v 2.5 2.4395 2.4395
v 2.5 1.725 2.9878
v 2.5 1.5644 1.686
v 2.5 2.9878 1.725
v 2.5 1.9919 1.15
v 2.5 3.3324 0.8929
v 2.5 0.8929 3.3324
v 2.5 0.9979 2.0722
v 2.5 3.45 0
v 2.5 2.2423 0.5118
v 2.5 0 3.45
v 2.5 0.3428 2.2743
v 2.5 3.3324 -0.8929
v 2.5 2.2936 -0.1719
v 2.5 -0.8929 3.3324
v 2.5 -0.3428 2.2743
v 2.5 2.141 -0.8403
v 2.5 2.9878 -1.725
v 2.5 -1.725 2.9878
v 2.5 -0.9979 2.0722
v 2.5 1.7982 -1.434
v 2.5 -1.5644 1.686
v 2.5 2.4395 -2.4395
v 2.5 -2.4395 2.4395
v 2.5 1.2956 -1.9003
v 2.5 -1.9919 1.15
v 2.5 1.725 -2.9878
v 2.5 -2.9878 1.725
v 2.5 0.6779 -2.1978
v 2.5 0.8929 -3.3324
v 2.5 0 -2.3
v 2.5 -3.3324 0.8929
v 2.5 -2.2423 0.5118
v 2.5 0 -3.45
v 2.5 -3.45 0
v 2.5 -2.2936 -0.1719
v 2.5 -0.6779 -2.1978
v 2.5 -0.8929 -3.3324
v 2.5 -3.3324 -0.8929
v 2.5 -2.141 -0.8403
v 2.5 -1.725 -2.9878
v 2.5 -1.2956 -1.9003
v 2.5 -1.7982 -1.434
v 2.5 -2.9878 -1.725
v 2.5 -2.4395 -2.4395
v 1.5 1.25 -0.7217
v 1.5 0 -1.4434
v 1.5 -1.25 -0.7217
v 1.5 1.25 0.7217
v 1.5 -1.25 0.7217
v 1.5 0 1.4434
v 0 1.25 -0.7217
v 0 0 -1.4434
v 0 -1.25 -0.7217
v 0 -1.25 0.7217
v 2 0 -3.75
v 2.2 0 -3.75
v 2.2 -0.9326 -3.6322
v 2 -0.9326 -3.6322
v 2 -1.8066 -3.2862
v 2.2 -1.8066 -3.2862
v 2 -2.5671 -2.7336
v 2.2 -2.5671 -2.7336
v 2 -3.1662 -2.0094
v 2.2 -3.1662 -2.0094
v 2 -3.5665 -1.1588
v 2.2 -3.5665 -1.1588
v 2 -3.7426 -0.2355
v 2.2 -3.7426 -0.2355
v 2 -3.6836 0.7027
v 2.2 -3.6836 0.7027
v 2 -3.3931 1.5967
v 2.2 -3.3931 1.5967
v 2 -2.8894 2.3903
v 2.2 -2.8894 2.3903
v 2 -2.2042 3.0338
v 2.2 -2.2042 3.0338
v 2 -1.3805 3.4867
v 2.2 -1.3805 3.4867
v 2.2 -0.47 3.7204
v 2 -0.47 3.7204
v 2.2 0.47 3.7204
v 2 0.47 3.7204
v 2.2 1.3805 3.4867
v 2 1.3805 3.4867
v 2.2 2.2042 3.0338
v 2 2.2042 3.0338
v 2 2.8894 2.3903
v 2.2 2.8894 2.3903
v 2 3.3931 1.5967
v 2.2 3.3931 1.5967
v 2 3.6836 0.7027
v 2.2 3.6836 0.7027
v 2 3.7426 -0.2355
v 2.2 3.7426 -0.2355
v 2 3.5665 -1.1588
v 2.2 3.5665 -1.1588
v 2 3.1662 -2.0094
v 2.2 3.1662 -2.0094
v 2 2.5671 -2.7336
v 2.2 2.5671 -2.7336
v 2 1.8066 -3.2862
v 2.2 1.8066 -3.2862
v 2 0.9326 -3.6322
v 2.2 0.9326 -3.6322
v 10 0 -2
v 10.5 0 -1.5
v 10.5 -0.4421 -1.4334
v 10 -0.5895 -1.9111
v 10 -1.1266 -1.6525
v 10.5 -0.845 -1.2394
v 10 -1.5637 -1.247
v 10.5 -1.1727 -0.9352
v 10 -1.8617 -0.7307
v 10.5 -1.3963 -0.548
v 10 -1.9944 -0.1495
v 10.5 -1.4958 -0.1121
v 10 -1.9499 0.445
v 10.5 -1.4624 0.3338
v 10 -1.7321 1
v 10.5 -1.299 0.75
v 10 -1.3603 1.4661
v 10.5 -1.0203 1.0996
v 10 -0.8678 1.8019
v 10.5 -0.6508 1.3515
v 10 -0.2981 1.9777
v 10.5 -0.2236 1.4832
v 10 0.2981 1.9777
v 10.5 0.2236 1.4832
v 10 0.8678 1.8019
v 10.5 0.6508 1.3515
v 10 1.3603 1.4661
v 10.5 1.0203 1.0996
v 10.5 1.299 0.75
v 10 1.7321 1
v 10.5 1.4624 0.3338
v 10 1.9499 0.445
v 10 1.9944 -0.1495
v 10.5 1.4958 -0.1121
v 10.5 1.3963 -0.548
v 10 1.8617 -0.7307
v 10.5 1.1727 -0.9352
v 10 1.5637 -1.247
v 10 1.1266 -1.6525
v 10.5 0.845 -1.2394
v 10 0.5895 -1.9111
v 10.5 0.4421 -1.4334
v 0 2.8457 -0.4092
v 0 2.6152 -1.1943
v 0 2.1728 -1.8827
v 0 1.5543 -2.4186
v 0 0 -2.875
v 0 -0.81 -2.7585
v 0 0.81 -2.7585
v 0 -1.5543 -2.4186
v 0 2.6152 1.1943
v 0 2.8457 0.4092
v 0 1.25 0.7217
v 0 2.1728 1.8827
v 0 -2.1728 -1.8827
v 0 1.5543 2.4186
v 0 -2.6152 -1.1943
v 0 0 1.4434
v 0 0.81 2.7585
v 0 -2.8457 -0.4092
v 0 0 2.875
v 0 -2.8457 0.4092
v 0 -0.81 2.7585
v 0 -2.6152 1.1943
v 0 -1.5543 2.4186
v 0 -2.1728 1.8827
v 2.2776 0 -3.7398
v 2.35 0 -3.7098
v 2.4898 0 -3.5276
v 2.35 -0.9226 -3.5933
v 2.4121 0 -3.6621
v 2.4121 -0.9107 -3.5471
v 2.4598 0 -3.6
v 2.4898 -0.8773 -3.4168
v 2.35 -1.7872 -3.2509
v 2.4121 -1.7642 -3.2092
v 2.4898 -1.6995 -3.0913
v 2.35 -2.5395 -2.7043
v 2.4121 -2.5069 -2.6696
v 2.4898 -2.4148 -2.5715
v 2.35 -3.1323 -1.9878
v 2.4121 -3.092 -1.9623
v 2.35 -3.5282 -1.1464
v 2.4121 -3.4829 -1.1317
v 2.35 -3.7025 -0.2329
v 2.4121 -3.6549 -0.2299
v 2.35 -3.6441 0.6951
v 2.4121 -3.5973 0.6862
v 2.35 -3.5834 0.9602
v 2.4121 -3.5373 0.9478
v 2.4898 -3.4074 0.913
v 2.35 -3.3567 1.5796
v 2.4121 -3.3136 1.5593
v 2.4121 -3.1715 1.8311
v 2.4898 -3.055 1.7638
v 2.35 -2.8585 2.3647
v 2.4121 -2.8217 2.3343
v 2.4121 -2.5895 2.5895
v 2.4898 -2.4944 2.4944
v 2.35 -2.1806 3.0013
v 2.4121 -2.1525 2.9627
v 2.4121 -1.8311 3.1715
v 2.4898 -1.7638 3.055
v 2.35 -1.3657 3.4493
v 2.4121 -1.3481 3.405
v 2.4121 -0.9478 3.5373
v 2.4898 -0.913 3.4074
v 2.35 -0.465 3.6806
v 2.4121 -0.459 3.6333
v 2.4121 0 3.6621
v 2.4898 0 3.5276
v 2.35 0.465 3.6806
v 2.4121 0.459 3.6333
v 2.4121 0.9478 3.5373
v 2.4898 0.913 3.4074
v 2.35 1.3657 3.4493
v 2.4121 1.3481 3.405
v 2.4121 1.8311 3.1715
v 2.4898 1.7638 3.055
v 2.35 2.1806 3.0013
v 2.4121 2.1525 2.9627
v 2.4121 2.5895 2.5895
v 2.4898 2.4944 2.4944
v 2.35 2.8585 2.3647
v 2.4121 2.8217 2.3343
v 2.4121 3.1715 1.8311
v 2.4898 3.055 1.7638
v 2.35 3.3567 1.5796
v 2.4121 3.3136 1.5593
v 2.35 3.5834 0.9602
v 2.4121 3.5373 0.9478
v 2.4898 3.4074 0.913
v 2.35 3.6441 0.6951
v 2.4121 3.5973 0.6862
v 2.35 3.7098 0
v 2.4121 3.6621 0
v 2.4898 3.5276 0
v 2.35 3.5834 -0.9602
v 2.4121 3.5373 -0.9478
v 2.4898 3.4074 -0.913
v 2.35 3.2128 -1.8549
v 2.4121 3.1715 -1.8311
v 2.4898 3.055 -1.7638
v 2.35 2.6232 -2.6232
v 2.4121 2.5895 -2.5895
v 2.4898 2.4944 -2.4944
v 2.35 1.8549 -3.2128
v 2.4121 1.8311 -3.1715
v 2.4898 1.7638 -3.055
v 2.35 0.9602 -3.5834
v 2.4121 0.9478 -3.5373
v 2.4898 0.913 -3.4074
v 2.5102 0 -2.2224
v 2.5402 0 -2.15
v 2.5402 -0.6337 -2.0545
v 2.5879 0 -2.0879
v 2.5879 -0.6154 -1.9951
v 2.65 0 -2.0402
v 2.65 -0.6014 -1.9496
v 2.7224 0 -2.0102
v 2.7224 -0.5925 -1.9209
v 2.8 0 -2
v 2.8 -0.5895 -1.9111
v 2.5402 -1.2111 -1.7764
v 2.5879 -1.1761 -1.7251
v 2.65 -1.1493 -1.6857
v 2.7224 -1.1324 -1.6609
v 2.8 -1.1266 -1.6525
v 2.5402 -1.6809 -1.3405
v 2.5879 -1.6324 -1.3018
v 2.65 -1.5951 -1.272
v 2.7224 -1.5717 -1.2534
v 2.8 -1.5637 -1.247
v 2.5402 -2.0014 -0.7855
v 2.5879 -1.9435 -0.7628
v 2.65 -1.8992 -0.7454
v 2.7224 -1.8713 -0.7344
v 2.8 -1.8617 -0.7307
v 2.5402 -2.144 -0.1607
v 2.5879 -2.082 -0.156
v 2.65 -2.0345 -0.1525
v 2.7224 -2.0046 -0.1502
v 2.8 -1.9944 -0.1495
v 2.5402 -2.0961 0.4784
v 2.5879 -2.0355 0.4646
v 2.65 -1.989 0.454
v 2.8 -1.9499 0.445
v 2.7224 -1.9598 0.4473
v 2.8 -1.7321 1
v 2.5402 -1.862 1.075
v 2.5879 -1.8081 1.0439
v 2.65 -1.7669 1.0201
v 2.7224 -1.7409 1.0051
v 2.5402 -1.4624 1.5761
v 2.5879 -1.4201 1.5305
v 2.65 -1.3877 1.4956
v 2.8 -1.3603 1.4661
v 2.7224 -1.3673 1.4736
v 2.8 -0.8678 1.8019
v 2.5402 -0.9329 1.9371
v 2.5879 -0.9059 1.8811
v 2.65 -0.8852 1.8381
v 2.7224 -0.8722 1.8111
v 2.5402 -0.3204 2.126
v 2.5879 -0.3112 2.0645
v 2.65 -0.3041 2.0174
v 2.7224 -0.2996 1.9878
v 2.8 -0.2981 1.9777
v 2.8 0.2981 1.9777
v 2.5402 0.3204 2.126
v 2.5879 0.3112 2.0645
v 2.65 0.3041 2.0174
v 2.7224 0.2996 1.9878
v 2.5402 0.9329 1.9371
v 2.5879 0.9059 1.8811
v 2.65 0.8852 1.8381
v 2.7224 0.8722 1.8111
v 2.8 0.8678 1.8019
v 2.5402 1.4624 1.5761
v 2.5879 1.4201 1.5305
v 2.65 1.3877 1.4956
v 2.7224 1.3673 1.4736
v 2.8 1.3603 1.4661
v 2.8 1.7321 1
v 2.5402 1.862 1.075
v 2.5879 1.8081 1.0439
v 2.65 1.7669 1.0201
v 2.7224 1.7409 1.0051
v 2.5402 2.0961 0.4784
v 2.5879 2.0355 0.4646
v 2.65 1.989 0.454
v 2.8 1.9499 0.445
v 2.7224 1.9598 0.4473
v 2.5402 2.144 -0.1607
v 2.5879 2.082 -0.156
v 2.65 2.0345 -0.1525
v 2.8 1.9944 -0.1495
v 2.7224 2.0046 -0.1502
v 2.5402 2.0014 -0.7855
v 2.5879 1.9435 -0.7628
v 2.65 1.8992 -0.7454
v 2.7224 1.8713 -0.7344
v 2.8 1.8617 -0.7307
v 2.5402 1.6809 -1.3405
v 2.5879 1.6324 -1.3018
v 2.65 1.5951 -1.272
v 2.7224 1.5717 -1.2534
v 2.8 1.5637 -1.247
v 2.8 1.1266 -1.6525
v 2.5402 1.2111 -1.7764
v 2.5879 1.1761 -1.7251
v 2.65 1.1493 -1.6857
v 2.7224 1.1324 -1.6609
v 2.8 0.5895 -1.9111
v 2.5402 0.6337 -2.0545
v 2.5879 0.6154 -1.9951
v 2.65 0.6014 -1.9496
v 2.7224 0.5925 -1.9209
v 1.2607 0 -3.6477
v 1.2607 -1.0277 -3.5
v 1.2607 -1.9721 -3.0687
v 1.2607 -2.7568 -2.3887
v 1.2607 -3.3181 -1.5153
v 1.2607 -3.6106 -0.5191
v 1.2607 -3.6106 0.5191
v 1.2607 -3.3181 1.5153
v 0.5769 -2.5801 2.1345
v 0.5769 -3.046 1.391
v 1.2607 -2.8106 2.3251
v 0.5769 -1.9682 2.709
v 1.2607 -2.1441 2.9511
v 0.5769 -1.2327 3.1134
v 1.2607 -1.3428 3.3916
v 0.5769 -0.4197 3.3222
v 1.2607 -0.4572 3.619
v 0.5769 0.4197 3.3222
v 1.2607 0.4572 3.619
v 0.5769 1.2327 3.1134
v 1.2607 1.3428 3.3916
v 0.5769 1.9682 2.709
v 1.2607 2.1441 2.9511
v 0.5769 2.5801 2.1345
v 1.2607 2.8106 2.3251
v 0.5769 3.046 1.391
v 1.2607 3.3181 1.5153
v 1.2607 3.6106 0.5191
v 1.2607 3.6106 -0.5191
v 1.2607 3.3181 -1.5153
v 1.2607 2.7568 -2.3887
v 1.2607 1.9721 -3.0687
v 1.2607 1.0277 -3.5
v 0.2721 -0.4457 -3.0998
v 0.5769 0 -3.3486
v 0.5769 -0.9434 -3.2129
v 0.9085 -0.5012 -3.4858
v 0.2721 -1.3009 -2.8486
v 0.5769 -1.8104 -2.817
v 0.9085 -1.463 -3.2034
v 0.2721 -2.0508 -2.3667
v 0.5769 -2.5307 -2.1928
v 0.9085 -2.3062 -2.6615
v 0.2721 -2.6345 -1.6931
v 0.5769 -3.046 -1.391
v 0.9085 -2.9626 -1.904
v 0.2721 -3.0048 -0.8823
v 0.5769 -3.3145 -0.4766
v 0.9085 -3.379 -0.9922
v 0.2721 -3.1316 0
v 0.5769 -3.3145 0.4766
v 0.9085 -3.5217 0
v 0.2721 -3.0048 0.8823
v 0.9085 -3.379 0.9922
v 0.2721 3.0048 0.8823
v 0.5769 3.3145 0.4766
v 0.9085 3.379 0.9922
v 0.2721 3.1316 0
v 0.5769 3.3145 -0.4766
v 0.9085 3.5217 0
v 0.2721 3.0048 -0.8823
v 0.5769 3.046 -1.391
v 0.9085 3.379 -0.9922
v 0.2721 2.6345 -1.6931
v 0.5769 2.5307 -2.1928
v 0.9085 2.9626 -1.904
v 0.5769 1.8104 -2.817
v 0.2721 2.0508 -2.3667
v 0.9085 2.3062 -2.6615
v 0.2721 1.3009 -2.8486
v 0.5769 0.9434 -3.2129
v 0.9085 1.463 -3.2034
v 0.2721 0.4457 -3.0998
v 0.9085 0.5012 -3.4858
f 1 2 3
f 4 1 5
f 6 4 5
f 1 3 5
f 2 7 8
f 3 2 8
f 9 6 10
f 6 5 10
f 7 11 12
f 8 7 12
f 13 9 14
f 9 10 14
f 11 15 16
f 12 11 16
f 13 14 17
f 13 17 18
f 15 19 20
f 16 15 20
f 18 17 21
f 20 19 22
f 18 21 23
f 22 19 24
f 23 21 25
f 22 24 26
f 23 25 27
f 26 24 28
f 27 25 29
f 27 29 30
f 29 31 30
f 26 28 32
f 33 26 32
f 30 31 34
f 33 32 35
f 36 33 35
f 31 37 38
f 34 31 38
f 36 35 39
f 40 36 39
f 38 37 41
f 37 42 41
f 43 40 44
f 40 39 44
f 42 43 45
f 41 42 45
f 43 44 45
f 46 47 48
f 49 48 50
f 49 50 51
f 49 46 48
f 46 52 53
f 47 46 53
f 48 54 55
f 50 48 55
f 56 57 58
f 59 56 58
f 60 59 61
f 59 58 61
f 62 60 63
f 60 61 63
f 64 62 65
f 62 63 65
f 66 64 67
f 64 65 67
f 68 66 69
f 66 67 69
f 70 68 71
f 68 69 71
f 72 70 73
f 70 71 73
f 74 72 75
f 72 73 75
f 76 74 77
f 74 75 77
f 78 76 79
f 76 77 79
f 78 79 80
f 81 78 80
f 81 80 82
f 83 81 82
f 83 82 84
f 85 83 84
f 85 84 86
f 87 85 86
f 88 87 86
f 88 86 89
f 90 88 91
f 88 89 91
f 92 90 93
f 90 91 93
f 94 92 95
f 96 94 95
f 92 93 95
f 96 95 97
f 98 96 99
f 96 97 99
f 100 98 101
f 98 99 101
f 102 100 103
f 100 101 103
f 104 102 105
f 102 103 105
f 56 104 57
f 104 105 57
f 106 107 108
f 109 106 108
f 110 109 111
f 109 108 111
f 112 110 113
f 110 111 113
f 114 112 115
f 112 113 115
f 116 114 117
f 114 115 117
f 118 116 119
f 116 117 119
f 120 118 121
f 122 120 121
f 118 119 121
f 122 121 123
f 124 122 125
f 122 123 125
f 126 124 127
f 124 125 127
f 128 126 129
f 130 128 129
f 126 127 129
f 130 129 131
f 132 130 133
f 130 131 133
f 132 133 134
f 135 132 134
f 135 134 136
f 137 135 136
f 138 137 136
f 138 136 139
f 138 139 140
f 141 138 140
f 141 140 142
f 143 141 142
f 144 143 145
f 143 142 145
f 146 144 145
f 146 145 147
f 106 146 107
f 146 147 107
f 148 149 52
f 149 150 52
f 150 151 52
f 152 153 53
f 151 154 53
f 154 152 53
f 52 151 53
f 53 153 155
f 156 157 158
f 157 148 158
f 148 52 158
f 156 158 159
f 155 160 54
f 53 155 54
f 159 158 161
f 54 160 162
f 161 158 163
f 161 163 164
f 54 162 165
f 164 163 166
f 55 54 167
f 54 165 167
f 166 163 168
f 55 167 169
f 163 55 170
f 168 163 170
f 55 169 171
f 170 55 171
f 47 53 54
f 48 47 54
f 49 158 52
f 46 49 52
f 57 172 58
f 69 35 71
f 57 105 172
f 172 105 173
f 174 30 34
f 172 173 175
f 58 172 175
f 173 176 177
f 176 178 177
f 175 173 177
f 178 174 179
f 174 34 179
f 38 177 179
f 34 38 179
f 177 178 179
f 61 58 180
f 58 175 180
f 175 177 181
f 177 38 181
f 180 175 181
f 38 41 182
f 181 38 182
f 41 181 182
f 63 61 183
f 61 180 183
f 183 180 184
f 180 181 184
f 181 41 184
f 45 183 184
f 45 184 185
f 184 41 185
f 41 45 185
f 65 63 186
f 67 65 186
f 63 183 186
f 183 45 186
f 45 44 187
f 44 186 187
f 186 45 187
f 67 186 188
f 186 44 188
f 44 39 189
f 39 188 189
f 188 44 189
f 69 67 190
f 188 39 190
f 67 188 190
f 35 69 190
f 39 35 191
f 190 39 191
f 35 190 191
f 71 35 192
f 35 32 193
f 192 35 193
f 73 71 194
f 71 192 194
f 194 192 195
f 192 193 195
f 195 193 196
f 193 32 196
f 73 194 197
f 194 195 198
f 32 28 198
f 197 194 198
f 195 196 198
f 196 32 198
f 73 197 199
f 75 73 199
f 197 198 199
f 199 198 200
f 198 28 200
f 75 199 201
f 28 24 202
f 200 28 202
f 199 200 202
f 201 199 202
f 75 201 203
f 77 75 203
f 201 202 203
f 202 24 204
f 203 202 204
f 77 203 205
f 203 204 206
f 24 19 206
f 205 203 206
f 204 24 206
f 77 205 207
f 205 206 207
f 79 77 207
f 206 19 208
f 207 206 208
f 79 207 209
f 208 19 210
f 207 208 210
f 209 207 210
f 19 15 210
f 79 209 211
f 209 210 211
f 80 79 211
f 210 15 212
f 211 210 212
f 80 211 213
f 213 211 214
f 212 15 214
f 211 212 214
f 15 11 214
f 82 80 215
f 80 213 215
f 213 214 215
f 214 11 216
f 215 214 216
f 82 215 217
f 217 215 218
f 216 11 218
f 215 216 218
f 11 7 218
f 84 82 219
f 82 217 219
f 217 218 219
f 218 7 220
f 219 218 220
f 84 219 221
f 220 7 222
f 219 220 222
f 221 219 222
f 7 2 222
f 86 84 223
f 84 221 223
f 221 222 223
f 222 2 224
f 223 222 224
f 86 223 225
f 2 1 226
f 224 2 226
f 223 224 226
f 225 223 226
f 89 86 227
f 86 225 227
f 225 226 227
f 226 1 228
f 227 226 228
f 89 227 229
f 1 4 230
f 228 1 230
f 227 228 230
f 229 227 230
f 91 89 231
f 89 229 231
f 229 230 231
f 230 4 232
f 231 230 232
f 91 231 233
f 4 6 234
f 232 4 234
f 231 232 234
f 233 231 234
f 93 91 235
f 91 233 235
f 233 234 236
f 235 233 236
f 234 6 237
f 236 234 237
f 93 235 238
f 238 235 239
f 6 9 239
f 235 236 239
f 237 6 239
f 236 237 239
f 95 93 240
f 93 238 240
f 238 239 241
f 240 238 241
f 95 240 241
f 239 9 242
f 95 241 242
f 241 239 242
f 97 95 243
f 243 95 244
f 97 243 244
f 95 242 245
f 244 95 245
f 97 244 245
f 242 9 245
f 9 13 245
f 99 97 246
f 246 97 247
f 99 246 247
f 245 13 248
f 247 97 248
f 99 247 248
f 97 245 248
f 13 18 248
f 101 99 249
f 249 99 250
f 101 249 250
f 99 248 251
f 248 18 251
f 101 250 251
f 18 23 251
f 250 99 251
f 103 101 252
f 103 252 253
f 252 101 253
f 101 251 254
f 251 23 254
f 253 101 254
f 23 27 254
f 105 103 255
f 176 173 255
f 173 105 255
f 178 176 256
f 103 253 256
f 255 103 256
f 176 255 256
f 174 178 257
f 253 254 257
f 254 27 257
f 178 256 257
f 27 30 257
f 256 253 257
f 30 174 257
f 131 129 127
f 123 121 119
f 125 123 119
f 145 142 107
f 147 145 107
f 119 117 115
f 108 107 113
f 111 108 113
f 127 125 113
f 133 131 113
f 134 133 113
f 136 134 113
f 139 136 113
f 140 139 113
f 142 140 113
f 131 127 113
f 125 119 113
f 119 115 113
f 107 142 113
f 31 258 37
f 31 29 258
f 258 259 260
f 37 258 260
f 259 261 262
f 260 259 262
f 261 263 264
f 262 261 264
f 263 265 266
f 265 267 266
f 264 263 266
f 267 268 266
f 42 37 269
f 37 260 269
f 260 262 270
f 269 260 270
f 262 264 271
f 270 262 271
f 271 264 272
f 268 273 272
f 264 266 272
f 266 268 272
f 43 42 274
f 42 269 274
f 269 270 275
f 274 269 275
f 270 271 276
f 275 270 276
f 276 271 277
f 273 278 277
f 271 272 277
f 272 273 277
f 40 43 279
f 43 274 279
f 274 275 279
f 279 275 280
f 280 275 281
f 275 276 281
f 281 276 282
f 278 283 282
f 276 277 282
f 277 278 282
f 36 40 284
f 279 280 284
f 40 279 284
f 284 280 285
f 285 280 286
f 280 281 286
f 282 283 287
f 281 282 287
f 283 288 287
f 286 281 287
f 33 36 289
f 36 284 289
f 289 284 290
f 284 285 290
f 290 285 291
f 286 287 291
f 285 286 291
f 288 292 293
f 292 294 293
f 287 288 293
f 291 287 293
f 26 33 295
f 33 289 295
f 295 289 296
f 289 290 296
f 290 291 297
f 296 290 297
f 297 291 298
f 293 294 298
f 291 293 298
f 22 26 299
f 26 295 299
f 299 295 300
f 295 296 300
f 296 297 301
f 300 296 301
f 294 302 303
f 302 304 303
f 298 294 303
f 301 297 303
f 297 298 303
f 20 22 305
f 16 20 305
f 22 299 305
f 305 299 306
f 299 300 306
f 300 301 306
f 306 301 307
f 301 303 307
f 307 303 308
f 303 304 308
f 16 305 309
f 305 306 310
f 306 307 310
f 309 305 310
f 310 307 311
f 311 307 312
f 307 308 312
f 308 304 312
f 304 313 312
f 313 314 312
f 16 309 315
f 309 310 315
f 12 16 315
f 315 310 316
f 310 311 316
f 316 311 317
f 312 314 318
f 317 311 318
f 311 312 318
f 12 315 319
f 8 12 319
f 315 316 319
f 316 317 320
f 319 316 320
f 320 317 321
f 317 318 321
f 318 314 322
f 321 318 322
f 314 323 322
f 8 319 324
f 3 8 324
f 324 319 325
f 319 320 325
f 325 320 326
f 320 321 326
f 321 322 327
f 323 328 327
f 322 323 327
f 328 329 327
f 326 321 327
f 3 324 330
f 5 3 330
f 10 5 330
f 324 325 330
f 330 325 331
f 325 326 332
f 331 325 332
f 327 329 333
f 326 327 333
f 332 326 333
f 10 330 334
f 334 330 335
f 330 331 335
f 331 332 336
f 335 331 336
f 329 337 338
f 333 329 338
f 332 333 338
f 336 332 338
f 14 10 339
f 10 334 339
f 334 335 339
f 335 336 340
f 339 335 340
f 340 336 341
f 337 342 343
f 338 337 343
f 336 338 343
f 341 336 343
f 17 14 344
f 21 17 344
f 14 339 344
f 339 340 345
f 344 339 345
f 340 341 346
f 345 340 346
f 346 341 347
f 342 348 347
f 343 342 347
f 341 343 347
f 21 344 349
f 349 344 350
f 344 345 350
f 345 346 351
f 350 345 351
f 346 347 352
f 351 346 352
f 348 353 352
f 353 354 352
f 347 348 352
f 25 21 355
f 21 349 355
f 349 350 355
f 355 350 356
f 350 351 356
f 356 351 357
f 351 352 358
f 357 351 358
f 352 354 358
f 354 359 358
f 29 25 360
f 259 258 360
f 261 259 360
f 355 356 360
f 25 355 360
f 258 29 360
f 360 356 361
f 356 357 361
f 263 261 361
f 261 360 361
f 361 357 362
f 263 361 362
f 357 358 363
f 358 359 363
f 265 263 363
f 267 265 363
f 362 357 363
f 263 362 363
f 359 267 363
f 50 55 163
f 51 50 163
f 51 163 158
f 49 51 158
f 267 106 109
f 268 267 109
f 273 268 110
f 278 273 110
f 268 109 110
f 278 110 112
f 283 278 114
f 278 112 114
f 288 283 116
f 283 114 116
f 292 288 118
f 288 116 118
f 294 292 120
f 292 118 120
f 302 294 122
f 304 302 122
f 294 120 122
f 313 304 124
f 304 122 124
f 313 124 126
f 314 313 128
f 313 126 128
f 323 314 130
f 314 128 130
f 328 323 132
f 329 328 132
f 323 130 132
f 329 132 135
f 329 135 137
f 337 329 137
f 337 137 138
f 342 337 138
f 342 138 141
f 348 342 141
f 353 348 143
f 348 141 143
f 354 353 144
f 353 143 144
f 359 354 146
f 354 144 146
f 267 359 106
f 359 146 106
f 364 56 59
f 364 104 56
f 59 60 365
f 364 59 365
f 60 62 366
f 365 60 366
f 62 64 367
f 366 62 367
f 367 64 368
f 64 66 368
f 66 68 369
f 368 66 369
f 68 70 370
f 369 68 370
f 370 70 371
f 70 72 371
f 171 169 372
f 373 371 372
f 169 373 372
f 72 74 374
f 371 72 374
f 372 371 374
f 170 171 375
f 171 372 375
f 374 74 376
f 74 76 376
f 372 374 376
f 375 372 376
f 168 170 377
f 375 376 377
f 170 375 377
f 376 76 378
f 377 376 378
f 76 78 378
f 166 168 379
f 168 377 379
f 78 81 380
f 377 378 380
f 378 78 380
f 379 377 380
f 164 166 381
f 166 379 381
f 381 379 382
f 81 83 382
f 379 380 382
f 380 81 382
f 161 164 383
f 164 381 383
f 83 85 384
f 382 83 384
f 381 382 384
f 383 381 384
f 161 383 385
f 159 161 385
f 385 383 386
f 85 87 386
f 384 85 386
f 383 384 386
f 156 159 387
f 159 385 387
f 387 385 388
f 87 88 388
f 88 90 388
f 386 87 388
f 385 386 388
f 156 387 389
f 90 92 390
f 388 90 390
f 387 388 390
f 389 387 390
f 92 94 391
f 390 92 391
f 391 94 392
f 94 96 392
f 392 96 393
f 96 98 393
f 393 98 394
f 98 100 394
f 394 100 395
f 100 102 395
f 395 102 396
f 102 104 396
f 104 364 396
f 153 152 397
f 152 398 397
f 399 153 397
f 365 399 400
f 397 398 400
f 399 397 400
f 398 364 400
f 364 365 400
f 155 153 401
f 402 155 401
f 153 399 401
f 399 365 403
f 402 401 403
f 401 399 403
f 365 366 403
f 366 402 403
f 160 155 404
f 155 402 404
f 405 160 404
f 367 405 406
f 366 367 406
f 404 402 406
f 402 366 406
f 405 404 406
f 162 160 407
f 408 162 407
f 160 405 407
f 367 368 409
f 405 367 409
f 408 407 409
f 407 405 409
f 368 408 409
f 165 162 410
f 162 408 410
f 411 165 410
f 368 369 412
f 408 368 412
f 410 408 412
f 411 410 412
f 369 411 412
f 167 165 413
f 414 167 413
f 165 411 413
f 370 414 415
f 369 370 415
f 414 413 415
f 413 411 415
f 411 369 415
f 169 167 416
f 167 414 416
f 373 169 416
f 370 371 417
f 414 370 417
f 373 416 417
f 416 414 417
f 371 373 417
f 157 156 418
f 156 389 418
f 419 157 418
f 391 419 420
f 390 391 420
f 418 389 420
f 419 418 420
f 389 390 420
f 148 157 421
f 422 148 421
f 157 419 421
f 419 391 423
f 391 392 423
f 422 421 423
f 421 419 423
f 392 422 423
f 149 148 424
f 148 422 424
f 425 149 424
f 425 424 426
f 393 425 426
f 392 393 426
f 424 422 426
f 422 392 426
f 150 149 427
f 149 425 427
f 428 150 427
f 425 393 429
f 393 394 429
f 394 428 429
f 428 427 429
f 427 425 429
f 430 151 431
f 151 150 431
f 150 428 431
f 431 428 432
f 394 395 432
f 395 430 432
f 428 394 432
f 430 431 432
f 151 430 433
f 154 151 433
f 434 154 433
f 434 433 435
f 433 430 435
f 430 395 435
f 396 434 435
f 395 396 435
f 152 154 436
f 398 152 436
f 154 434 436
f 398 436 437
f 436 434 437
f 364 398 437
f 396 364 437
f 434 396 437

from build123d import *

# Parameters (mm, degrees)
CUT_EXTRUDE_1_DEPTH = 1.5
FILLET_1_R          = 0.3
CHAMFER_1_SIZE      = 0.5


with BuildPart() as part:
    # Эскиз1 → Повернуть1 (revolve)
    with BuildSketch(Plane.XY, mode=Mode.PRIVATE) as revolve_1_sk:
        with BuildLine():
            Line((0, 0), (0, 2.875))
            ThreePointArc((0, 2.875), (0.908484425, 3.521678457), (2, 3.75))
            Line((2, 3.75), (2.5, 3.75))
            Line((2.5, 3.75), (2.5, 2))
            Line((2.5, 2), (10.5, 2))
            Line((10.5, 2), (10.5, 0))
            Line((10.5, 0), (0, 0))
        make_face()
    revolve(revolve_1_sk.sketch.rotate(Axis((10.5, 0, 0), (-1, 0, 0)), 90), axis=Axis((10.5, 0, 0), (-1, 0, 0)))  # turned: the seam where the file's is

    # Эскиз2 → Вырез-Вытянуть1 (cut)
    with BuildSketch(Plane.ZY):
        Polygon((0.721687836, 1.25), (-0.721687836, 1.25), (-1.443375673, 0), (-0.721687836, -1.25), (0.721687836, -1.25), (1.443375673, 0), align=None)
    extrude(amount=-CUT_EXTRUDE_1_DEPTH, mode=Mode.SUBTRACT)

    # Скругление1
    fillet_1_edges = [part.edges().sort_by_distance(p)[0] for p in [
        (2.5, 0, 2),
        (2.5, 0, 3.75),
    ]]
    fillet(fillet_1_edges, radius=FILLET_1_R)

    # Фаска1
    chamfer_1_edges = [part.edges().sort_by_distance(p)[0] for p in [
        (10.5, 0, 2),
    ]]
    chamfer(chamfer_1_edges, length=CHAMFER_1_SIZE)


solid = part.part
